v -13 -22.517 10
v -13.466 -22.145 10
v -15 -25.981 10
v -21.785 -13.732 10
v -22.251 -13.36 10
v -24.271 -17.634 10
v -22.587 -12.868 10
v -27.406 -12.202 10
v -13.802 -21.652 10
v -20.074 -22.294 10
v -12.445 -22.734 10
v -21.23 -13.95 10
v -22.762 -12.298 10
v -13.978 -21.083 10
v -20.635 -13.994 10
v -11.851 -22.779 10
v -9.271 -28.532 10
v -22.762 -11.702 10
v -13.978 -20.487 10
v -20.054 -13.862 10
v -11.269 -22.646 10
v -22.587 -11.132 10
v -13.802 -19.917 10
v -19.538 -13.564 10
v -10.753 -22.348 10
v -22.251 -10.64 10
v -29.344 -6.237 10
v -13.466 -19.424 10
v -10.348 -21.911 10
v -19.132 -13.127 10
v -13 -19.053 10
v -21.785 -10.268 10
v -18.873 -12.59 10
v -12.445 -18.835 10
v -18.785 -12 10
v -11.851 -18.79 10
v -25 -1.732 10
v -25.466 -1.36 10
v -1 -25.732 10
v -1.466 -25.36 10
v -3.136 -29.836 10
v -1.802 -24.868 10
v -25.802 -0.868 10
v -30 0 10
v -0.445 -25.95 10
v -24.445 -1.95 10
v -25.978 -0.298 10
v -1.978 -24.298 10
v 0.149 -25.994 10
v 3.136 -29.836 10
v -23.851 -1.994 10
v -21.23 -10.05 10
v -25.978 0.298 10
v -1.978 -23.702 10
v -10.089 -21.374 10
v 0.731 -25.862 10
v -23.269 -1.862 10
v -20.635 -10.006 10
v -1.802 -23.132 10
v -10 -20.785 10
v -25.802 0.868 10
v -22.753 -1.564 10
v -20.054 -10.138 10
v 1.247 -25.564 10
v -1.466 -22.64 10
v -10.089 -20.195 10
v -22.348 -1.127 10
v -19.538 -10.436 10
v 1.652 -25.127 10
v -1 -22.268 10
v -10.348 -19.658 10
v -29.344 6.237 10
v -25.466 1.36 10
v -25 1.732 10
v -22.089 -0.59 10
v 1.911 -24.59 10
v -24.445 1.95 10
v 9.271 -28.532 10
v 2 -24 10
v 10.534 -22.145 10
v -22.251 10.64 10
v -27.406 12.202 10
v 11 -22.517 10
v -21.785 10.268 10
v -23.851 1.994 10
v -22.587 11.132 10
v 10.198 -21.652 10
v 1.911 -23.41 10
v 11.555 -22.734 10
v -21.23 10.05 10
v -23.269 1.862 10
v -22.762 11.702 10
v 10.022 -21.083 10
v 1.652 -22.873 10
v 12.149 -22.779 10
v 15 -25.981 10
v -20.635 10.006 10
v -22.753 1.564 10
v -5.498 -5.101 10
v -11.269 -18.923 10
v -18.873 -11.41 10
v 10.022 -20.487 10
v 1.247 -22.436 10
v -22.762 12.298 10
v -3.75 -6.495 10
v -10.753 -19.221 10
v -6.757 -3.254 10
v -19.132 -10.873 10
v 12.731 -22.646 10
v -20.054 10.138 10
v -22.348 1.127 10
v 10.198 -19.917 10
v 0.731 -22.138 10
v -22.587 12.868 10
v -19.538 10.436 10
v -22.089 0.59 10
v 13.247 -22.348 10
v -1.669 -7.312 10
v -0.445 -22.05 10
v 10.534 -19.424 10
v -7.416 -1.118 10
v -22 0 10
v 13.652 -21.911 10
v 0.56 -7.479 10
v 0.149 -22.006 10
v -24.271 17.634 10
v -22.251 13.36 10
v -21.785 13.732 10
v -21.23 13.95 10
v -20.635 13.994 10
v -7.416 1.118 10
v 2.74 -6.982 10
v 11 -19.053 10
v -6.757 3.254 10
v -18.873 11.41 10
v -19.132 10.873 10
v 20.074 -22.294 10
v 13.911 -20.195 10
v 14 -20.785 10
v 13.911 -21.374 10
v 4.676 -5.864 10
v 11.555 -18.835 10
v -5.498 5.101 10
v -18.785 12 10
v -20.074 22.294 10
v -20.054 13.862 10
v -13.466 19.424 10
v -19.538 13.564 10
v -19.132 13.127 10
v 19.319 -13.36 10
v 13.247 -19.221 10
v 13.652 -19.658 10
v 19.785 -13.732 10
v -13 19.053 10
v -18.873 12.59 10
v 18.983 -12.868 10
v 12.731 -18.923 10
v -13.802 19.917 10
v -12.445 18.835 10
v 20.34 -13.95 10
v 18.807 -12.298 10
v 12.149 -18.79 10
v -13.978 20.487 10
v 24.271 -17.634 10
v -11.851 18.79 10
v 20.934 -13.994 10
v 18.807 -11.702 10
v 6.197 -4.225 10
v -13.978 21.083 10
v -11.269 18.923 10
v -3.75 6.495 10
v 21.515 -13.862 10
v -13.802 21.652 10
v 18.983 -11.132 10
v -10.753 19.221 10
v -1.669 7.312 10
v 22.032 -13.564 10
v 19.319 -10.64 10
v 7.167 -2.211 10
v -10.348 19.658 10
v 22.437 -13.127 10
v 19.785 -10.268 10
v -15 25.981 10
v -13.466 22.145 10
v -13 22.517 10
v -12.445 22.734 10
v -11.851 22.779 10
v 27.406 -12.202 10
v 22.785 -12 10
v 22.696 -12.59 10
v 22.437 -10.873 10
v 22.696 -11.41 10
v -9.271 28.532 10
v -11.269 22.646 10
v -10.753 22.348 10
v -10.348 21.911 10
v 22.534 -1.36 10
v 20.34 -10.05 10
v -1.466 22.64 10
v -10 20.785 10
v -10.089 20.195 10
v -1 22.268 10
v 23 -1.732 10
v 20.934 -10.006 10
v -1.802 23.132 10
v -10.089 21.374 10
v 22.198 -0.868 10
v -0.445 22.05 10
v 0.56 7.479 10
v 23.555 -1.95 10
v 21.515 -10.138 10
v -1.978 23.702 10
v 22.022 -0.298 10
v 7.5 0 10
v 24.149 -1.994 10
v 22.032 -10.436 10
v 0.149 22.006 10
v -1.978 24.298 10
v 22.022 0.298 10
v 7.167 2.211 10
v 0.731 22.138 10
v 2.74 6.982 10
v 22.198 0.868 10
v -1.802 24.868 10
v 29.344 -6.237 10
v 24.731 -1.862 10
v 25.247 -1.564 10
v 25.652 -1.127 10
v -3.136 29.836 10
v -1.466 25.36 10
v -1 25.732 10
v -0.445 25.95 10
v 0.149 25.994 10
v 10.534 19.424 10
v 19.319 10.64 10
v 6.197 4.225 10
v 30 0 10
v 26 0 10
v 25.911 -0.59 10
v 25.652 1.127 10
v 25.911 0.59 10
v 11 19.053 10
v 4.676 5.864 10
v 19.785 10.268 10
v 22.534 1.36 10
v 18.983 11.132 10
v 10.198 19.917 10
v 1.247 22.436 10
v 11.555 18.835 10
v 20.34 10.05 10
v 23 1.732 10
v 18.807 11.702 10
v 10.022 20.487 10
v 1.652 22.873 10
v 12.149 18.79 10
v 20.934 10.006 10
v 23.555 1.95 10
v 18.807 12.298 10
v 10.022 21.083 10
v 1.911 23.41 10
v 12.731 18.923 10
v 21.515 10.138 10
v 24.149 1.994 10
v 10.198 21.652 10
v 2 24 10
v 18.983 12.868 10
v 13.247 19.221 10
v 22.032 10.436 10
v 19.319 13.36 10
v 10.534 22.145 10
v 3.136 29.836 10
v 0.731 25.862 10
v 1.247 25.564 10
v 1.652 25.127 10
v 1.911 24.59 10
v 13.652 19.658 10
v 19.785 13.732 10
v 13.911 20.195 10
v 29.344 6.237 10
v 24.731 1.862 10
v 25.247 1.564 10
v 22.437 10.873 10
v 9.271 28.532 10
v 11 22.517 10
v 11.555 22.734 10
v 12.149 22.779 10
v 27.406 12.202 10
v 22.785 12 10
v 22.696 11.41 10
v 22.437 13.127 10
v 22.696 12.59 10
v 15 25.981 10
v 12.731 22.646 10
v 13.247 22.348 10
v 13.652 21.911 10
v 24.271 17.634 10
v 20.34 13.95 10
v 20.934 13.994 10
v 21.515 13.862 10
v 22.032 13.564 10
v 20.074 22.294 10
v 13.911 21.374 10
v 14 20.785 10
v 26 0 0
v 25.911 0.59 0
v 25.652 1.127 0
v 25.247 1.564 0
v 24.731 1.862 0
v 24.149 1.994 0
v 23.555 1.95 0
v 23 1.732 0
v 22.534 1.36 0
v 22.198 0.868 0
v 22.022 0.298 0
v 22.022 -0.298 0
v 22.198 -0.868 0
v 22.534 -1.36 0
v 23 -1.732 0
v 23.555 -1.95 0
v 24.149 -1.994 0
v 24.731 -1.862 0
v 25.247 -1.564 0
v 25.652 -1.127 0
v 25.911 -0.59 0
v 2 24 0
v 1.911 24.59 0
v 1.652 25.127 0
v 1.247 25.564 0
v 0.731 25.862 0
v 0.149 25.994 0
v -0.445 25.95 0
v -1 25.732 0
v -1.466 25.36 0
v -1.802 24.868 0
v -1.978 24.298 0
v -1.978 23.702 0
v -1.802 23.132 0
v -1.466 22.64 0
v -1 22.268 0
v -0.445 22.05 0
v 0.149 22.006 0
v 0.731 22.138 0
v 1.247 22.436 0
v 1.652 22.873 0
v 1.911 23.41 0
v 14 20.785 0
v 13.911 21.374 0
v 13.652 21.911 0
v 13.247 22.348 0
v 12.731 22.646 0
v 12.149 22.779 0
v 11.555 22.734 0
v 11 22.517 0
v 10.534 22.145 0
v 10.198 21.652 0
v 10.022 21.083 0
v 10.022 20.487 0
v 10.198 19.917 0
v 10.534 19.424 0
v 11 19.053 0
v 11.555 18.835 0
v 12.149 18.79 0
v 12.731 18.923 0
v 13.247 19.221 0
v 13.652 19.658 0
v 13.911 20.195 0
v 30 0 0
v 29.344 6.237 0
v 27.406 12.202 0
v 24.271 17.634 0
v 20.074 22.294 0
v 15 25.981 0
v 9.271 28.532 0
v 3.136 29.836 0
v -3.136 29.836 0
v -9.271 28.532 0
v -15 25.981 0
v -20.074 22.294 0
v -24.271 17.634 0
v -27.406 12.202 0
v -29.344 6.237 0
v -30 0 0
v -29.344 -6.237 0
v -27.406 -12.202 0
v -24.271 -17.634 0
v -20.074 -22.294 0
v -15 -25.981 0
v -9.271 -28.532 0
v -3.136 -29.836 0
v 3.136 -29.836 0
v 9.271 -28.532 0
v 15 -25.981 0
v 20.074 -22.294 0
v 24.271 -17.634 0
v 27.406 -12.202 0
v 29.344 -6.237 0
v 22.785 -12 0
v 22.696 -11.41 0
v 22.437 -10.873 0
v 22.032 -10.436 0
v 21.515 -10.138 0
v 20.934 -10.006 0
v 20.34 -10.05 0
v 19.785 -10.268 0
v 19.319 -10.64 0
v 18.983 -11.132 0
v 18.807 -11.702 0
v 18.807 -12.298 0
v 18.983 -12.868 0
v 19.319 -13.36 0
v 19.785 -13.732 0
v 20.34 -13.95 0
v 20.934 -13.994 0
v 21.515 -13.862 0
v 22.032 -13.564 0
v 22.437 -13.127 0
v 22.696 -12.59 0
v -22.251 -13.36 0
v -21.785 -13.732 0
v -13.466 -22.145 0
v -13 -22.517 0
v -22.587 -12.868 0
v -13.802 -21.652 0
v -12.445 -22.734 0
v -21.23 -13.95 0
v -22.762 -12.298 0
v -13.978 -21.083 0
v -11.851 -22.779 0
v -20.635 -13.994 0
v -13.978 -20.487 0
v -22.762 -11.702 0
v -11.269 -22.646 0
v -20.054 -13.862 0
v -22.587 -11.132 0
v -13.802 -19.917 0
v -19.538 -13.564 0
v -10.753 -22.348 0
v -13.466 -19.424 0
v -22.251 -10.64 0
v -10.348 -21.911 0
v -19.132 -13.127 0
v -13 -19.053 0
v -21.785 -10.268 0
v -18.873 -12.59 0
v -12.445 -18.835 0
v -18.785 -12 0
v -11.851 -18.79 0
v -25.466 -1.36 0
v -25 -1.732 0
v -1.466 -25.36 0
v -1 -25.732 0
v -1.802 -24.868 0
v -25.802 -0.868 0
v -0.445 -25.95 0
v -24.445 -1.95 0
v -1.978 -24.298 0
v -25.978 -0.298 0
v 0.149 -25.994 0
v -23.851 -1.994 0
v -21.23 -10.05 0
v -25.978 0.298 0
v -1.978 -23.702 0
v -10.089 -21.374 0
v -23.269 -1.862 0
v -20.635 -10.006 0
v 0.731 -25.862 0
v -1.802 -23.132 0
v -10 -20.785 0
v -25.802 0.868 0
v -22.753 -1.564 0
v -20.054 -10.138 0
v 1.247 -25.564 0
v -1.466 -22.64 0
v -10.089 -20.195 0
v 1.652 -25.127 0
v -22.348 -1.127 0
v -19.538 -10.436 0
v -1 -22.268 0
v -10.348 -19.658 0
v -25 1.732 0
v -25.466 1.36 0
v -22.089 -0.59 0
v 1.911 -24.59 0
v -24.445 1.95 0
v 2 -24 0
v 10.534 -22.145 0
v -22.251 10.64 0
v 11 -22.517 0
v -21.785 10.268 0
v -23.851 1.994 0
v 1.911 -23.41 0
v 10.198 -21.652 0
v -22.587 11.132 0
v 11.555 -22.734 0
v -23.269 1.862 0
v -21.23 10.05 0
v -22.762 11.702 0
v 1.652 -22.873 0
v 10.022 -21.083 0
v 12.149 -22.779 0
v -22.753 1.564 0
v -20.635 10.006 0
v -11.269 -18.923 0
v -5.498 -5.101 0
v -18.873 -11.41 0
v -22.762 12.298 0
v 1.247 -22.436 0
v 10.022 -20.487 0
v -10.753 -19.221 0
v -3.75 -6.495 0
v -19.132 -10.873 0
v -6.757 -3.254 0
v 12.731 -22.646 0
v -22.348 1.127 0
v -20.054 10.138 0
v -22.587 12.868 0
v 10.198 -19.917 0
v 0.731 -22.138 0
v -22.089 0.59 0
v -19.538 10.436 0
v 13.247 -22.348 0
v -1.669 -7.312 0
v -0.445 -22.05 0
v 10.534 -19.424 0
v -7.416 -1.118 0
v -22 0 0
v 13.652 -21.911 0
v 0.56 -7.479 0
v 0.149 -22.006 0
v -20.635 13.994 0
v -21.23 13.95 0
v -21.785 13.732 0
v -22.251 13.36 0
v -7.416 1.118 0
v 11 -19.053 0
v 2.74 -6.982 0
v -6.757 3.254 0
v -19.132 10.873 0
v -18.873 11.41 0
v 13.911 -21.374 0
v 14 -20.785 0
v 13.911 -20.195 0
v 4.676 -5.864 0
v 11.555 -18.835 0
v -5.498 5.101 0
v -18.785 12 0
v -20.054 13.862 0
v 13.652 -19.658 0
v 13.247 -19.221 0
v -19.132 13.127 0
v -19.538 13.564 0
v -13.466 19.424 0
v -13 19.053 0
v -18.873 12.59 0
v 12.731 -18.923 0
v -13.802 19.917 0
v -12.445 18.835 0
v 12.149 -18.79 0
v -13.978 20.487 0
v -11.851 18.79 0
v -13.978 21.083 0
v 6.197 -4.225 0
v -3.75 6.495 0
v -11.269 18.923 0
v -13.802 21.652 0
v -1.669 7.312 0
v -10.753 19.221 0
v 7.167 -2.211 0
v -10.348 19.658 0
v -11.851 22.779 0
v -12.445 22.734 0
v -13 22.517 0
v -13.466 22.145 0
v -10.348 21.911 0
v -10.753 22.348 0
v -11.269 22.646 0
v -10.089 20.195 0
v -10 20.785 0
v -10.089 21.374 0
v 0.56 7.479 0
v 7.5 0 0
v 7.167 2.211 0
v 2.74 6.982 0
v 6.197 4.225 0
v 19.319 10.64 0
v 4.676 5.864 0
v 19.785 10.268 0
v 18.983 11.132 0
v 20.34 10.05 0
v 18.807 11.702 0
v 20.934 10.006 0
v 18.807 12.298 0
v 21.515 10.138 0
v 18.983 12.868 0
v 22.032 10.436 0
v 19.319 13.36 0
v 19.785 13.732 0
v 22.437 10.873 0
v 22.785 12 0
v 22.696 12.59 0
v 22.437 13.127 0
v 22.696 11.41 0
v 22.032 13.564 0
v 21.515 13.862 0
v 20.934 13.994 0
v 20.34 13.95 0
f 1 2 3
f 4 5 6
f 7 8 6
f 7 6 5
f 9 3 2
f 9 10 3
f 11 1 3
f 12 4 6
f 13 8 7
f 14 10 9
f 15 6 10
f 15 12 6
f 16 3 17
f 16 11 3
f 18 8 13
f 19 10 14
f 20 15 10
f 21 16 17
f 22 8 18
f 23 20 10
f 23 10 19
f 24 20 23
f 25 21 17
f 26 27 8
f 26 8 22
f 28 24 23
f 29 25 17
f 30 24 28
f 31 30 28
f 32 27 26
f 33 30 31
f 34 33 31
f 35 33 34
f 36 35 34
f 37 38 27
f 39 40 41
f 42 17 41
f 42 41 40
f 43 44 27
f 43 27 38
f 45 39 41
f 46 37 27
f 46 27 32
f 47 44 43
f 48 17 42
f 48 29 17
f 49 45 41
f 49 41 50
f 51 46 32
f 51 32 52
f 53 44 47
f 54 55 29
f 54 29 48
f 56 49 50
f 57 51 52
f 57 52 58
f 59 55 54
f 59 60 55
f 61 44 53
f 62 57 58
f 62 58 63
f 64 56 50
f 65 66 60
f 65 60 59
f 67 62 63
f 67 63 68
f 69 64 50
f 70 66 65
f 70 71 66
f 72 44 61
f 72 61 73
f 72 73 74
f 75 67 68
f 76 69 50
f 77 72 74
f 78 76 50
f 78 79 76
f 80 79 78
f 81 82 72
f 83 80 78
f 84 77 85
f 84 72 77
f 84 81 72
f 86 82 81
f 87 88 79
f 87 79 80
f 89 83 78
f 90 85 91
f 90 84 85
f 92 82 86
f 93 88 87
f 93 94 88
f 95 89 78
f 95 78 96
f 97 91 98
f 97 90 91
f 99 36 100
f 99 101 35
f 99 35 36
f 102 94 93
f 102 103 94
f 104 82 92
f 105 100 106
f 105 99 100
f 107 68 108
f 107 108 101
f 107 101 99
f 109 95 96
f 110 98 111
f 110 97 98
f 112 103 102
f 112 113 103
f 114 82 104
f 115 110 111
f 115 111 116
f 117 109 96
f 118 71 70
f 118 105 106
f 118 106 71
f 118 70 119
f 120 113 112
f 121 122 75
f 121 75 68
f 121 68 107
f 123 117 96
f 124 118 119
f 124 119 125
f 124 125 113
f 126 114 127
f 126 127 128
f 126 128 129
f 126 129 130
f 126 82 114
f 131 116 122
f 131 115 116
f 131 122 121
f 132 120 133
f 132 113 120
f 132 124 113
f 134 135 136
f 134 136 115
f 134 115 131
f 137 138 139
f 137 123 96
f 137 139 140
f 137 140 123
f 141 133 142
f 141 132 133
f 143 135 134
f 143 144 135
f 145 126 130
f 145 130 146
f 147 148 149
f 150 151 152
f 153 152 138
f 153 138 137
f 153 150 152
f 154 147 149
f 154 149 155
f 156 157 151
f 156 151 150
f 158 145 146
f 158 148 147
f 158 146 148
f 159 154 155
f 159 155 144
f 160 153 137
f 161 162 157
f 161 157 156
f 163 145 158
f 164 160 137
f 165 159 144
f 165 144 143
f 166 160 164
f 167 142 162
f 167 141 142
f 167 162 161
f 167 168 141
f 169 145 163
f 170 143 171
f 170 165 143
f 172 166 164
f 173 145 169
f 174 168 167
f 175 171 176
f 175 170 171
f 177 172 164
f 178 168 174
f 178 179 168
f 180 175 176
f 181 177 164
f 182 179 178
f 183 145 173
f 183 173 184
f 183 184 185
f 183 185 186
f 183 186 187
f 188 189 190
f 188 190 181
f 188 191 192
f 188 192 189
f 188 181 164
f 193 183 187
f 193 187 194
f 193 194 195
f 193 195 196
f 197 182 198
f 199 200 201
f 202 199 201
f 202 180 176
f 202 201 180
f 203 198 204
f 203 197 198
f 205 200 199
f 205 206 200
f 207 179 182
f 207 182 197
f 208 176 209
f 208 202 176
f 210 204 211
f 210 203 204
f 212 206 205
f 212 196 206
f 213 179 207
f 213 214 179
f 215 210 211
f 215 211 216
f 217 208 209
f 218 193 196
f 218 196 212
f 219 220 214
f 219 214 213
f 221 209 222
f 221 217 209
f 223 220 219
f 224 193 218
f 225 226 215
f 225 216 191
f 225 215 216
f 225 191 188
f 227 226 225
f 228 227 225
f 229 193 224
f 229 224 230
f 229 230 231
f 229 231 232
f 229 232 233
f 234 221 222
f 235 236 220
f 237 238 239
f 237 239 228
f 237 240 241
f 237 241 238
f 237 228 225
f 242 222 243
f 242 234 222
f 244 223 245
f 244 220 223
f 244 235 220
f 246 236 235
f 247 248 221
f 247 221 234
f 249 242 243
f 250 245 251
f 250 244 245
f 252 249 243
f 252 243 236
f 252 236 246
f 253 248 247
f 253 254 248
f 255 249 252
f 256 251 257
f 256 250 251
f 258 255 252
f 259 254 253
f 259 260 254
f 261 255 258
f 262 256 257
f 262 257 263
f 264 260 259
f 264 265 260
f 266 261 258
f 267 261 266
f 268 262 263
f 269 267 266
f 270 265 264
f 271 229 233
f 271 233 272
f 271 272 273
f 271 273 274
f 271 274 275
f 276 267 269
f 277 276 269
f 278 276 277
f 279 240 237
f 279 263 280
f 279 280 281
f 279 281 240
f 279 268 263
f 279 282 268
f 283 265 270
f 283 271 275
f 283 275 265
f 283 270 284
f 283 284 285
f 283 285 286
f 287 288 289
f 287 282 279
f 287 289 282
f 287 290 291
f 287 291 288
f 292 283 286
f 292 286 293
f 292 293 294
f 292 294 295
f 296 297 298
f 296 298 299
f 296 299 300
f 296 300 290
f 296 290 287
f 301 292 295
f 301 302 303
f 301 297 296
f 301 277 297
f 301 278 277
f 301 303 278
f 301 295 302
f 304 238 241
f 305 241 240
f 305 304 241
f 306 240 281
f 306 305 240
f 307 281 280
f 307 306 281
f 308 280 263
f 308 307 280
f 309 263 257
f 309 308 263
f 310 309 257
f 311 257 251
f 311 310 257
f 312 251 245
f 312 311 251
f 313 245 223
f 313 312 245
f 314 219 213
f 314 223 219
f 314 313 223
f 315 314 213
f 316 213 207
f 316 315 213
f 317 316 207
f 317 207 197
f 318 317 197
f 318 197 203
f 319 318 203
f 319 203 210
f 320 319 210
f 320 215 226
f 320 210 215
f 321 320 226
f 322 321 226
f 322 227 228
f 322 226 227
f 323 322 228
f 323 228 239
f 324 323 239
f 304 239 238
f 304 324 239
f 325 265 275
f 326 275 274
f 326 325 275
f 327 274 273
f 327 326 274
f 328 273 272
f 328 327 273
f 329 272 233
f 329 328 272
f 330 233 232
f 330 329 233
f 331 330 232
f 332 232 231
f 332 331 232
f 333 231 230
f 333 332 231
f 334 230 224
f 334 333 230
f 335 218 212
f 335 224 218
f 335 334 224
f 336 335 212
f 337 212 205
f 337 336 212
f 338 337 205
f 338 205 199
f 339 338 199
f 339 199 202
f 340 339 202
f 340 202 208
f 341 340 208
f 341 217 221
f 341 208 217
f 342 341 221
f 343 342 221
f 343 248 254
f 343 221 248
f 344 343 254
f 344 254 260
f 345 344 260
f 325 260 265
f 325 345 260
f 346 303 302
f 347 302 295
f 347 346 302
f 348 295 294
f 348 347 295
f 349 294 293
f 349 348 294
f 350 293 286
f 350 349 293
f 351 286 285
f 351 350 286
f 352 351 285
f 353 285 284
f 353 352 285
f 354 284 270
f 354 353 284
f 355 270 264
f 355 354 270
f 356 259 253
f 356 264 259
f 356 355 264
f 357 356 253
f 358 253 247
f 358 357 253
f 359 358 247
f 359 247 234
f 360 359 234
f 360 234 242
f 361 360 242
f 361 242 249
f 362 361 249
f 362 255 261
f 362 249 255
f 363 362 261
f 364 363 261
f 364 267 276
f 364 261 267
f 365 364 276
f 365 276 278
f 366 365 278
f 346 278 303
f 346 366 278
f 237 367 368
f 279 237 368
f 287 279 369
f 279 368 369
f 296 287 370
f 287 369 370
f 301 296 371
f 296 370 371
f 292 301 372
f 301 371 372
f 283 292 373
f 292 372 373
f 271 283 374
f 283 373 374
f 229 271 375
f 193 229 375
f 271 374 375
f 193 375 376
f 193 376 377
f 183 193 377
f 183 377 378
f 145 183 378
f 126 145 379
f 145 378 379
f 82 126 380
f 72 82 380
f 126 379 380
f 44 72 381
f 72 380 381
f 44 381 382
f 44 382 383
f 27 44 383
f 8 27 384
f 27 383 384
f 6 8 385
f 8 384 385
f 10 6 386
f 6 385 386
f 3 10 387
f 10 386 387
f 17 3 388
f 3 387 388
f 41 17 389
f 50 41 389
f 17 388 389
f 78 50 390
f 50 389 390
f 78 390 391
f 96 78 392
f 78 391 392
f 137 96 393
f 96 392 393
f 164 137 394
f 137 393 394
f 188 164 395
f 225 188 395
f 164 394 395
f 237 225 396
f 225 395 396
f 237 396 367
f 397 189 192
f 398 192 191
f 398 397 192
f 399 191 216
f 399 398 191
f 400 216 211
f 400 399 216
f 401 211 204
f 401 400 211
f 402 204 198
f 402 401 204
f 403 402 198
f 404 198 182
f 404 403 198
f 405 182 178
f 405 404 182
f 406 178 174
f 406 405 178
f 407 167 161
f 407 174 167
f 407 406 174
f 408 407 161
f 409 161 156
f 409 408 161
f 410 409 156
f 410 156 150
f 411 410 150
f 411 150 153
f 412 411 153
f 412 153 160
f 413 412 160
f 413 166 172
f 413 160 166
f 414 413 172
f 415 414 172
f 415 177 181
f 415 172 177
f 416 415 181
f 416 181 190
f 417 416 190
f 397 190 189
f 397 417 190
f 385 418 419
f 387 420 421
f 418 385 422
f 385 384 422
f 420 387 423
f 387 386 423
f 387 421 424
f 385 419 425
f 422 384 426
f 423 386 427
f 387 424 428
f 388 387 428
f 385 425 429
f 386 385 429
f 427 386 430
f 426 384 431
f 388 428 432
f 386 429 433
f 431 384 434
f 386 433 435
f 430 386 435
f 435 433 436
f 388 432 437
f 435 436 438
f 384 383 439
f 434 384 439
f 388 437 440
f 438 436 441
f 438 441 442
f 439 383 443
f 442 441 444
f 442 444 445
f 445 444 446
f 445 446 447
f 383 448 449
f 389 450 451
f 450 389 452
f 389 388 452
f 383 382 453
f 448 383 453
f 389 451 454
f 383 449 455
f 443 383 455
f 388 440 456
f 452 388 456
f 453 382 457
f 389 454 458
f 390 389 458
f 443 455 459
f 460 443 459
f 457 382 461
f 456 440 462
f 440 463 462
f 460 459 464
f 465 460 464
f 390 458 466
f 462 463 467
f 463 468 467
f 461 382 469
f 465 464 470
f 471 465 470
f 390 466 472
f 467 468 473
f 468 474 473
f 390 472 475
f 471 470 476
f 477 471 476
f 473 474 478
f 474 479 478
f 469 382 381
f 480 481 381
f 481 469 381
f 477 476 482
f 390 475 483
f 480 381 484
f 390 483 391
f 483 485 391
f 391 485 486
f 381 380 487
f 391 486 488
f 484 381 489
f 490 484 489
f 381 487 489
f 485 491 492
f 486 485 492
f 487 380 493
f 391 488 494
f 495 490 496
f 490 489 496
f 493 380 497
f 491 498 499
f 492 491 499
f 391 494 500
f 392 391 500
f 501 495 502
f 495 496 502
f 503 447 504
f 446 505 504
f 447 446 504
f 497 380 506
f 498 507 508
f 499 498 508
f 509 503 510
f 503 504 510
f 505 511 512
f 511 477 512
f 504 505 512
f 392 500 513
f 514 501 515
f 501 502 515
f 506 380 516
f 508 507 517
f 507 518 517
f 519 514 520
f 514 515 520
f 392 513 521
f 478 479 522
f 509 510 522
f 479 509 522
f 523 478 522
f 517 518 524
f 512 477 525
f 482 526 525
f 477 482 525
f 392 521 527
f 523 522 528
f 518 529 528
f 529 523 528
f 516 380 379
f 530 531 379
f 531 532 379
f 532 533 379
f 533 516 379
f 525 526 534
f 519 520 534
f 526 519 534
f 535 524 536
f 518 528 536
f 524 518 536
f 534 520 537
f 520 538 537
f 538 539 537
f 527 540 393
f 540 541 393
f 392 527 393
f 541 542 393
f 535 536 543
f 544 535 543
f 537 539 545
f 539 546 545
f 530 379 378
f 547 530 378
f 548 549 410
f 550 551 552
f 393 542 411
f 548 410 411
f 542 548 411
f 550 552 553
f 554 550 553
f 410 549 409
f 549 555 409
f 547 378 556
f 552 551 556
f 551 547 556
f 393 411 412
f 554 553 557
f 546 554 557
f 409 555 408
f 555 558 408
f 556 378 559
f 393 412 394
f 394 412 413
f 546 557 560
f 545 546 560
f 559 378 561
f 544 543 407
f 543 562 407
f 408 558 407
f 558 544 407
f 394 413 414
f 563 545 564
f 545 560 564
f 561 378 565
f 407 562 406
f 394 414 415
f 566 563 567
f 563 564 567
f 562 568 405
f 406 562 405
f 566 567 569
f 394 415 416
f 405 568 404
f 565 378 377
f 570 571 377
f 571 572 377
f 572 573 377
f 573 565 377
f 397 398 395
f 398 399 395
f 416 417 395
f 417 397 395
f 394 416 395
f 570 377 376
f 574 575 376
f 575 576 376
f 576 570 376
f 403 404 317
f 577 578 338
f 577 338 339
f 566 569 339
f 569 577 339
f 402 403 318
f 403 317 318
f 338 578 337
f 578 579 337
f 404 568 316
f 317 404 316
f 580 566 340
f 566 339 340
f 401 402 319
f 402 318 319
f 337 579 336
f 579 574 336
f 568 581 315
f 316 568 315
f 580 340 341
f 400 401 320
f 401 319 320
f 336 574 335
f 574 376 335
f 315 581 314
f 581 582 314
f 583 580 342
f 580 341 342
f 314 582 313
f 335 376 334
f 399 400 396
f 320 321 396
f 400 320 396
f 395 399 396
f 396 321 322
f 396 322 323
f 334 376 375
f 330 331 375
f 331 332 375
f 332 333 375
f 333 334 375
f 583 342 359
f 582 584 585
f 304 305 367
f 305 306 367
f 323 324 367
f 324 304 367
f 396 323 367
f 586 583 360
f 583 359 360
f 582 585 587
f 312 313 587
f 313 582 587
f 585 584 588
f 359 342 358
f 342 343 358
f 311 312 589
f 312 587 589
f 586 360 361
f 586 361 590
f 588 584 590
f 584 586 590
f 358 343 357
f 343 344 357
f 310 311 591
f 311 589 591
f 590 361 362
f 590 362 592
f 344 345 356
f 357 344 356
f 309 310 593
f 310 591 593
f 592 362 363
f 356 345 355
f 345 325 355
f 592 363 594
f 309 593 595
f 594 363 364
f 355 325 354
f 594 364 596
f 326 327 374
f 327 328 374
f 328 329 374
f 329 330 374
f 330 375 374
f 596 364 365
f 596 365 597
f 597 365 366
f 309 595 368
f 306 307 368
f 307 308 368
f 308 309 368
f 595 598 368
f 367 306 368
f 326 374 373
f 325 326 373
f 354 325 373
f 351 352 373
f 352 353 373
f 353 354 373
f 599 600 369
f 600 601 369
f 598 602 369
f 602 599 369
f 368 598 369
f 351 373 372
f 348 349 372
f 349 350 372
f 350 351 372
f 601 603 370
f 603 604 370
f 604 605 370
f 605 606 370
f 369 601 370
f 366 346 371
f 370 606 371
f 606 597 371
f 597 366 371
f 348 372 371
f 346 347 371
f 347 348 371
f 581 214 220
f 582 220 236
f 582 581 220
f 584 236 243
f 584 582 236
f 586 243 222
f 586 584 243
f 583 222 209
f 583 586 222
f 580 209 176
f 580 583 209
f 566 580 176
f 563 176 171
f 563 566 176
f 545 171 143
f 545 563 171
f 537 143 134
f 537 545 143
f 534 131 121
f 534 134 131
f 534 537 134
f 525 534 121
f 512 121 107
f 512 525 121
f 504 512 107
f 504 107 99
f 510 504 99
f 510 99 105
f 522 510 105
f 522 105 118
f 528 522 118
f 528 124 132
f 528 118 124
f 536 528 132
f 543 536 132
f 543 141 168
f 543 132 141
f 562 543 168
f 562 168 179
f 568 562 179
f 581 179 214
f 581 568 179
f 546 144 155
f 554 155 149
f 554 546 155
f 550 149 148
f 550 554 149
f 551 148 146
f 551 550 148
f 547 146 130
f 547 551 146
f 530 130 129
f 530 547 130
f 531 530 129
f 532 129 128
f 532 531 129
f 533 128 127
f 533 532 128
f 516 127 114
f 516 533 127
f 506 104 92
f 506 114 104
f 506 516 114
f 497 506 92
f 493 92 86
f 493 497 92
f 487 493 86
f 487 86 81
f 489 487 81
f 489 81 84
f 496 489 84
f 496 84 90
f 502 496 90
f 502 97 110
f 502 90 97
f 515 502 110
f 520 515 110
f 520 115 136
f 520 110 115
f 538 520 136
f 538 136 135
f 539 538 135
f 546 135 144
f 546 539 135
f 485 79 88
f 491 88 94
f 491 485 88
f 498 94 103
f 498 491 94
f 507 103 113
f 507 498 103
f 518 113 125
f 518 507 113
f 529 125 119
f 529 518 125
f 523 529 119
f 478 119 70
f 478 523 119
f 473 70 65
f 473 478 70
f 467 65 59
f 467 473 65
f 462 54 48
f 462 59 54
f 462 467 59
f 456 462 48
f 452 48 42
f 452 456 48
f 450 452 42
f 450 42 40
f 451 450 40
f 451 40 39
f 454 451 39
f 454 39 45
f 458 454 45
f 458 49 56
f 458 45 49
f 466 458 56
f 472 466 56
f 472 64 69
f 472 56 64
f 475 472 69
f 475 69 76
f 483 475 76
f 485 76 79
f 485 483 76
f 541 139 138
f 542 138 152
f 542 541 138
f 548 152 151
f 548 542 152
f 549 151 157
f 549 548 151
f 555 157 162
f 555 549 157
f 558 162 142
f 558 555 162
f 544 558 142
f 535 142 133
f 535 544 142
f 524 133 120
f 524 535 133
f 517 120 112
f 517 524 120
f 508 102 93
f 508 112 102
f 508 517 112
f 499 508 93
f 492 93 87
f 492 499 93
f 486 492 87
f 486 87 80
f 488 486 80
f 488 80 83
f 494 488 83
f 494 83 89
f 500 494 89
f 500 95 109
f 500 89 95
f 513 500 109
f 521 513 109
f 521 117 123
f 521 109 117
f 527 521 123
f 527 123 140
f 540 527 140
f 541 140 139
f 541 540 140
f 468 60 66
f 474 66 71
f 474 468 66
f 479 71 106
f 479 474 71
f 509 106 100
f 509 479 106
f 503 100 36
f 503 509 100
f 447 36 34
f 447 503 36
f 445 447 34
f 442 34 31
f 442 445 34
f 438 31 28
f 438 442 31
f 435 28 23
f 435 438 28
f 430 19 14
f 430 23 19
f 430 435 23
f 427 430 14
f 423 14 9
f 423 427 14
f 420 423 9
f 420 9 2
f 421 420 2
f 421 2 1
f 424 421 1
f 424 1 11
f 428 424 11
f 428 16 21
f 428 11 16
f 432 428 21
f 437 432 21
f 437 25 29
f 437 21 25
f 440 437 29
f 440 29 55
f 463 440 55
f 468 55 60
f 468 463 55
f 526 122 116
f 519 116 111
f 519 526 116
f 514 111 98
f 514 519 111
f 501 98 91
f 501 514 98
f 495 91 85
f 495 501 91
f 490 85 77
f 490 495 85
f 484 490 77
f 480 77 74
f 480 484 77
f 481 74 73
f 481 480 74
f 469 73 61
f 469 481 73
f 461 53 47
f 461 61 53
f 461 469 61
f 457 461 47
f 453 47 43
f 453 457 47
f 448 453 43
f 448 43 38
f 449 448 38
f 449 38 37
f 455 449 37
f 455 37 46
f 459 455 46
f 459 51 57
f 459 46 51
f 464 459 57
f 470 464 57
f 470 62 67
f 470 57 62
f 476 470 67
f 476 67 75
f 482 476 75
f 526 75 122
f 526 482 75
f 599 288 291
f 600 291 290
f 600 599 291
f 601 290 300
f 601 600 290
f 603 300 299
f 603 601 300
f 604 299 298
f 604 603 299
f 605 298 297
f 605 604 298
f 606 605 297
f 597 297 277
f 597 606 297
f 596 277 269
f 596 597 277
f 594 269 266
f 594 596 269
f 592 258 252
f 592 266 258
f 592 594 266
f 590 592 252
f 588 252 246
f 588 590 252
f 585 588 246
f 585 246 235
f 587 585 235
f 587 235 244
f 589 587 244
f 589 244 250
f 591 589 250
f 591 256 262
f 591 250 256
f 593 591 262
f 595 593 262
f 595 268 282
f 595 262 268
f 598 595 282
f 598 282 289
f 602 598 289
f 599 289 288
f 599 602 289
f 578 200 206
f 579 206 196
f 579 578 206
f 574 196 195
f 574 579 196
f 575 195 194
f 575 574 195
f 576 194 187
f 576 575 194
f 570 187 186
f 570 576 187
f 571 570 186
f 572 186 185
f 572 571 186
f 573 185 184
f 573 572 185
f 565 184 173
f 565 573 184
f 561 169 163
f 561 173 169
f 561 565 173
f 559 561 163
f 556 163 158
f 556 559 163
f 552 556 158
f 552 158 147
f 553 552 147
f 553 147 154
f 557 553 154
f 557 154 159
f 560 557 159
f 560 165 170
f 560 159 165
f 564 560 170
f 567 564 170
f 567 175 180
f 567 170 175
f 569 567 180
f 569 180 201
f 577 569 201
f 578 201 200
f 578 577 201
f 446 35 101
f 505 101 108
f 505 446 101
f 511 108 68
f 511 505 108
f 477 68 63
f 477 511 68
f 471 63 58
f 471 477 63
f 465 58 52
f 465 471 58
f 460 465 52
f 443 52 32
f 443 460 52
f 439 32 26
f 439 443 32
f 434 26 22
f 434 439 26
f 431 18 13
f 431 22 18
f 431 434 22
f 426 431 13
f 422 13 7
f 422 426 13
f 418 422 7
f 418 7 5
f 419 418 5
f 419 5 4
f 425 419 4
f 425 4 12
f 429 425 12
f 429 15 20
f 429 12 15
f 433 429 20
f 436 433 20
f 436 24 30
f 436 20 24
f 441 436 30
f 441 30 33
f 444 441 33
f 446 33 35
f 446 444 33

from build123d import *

# Parameters (mm, degrees)
SKETCH_1_R          = 30
EXTRUDE_1_DEPTH     = 10
SKETCH_2_R          = 7.5
CUT_EXTRUDE_1_DEPTH = 44.588989435
SKETCH_3_R          = 2
CUT_EXTRUDE_2_DEPTH = 44.588989435


with BuildPart() as part:
    # 草图1 → 凸台-拉伸1 (new body)
    with BuildSketch(Plane.XY):
        Circle(SKETCH_1_R)
    extrude(amount=EXTRUDE_1_DEPTH)

    # 草图2 → 切除-拉伸1 (cut, through all)
    with BuildSketch(Plane.XY):
        Circle(SKETCH_2_R)
    extrude(amount=CUT_EXTRUDE_1_DEPTH, mode=Mode.SUBTRACT)

    # 草图3 → 切除-拉伸2 (cut, through all)
    with BuildSketch(Plane.XY):
        with Locations((24, 0)):
            Circle(SKETCH_3_R)
        with Locations((20.78461, 12)):
            Circle(SKETCH_3_R)
        with Locations((12, 20.78461)):
            Circle(SKETCH_3_R)
        with Locations((0, 24)):
            Circle(SKETCH_3_R)
        with Locations((-12, 20.78461)):
            Circle(SKETCH_3_R)
        with Locations((-20.78461, 12)):
            Circle(SKETCH_3_R)
        with Locations((-24, 0)):
            Circle(SKETCH_3_R)
        with Locations((-20.78461, -12)):
            Circle(SKETCH_3_R)
        with Locations((-12, -20.78461)):
            Circle(SKETCH_3_R)
        with Locations((0, -24)):
            Circle(SKETCH_3_R)
        with Locations((12, -20.78461)):
            Circle(SKETCH_3_R)
        with Locations((20.78461, -12)):
            Circle(SKETCH_3_R)
    extrude(amount=CUT_EXTRUDE_2_DEPTH, mode=Mode.SUBTRACT)


solid = part.part
